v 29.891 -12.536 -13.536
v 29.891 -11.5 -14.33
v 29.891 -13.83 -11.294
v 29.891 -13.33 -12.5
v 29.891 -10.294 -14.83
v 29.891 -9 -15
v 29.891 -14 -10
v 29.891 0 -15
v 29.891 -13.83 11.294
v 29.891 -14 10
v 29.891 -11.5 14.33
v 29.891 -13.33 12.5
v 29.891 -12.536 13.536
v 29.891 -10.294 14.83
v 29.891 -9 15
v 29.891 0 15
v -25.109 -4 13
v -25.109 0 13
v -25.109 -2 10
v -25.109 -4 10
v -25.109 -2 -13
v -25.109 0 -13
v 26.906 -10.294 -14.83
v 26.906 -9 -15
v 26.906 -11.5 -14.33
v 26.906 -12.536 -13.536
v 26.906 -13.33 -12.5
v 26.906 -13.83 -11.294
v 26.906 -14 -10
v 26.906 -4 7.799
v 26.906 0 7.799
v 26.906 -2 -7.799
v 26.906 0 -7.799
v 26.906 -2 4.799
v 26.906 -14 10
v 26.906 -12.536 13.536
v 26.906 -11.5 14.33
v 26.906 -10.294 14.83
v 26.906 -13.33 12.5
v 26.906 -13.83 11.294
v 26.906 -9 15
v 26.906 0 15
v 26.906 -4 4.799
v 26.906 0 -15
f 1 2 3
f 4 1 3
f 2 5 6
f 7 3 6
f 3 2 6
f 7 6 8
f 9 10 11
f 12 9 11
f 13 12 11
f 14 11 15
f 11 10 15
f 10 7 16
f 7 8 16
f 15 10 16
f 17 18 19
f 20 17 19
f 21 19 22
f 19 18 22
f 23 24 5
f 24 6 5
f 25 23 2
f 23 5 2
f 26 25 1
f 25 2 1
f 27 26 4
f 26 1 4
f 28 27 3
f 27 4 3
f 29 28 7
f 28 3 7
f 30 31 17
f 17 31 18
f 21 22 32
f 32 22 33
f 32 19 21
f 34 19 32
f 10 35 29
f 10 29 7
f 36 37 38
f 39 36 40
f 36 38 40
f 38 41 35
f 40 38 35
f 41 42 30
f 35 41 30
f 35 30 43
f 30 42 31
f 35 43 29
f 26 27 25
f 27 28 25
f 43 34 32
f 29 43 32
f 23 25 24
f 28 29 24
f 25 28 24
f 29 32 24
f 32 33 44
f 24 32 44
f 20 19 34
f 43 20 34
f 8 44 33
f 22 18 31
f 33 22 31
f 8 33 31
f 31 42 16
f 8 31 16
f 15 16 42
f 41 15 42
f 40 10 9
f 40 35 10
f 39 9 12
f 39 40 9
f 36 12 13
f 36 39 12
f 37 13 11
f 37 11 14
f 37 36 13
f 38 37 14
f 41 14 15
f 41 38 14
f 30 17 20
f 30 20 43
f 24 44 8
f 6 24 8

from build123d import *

# Parameters (mm, degrees)
F1_DEPTH = 2
F2_DEPTH = 14
F3_DEPTH = 4
F4_DEPTH = 14
F5_R     = 5


with BuildPart() as f1:
    # F0 (on Front) → F1 (new body)
    with BuildSketch(Plane.XZ):
        Polygon((26.906193, 0), (-25.108696, 0), (-25.108696, -13), (26.906193, -7.798511), align=None)
        Polygon((-25.108696, 10), (-25.108696, 0), (26.906193, 0), (26.906193, 4.798511), align=None)
    extrude(amount=F1_DEPTH)

    # F0 (on Front) → F2 (join)
    with BuildSketch(Plane.XZ):
        Polygon((26.906193, 4.798511), (26.906193, 0), (29.891304, 0), (29.891304, 15), (26.906193, 15), (26.906193, 7.798511), align=None)
    extrude(amount=F2_DEPTH)

    # F0 (on Front) → F3 (join)
    with BuildSketch(Plane.XZ):
        Polygon((-25.108696, 13), (-25.108696, 10), (26.906193, 4.798511), (26.906193, 7.798511), align=None)
    extrude(amount=F3_DEPTH)

    # F0 (on Front) → F4 (join)
    with BuildSketch(Plane.XZ):
        Polygon((29.891304, 0), (26.906193, 0), (26.906193, -7.798511), (26.906193, -15), (29.891304, -15), align=None)
    extrude(amount=F4_DEPTH)

    # F5
    f5_edges = [f1.edges().sort_by_distance(p)[0] for p in [
        (28.398748, -14, -15),
        (28.398748, -14, 15),
    ]]
    fillet(f5_edges, radius=F5_R)


solid = f1.part
